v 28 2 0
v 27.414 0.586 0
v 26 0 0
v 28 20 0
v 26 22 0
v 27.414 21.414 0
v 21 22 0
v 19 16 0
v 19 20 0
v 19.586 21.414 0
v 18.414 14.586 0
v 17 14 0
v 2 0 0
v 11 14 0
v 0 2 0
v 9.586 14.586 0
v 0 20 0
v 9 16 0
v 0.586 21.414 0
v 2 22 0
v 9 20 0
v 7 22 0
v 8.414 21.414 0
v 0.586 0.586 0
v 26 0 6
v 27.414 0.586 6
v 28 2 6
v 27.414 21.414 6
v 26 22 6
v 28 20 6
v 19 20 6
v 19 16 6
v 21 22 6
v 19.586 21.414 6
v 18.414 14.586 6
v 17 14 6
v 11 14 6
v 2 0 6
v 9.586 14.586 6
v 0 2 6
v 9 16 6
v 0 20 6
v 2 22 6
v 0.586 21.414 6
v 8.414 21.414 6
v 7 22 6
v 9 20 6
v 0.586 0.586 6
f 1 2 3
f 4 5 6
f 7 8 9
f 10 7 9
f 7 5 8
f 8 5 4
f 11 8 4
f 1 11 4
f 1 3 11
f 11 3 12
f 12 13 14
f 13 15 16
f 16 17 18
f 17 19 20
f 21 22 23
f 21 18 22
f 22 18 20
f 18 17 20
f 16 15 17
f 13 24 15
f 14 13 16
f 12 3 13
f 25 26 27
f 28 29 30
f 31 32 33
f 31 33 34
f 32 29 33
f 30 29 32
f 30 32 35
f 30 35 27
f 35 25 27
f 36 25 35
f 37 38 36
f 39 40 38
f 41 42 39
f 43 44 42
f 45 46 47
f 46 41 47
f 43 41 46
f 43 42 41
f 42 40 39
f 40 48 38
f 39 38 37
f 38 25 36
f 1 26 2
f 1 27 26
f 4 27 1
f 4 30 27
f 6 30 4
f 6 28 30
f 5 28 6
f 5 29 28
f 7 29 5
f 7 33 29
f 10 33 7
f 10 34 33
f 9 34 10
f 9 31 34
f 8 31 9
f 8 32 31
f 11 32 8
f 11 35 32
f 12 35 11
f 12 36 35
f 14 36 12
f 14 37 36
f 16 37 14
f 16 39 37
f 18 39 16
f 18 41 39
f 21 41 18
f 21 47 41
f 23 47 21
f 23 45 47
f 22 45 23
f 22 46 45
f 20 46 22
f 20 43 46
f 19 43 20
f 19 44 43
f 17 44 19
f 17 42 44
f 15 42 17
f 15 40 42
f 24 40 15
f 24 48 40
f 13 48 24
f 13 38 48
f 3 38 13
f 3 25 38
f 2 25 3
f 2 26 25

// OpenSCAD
$fn = 32;

// ----------------------------------------------------------------------
// Eye lug: clevis, 6 mm thick
// ----------------------------------------------------------------------

// --- parameters (mm) ---
profile_height = 6;       // extrusion height
profile_points = 24;      // points of the closed outline

profile = [[0, 2], [0.586, 0.586], [2, 0], [26, 0], [27.414, 0.586], [28, 2], [28, 20], [27.414, 21.414], [26, 22], [21, 22], [19.586, 21.414], [19, 20], [19, 16], [18.414, 14.586], [17, 14], [11, 14], [9.586, 14.586], [9, 16], [9, 20], [8.414, 21.414], [7, 22], [2, 22], [0.586, 21.414], [0, 20]];  // single closed polygon, 24 points, counter clockwise

// --- the one profile operation ---
linear_extrude(height = profile_height) polygon(points = profile);
